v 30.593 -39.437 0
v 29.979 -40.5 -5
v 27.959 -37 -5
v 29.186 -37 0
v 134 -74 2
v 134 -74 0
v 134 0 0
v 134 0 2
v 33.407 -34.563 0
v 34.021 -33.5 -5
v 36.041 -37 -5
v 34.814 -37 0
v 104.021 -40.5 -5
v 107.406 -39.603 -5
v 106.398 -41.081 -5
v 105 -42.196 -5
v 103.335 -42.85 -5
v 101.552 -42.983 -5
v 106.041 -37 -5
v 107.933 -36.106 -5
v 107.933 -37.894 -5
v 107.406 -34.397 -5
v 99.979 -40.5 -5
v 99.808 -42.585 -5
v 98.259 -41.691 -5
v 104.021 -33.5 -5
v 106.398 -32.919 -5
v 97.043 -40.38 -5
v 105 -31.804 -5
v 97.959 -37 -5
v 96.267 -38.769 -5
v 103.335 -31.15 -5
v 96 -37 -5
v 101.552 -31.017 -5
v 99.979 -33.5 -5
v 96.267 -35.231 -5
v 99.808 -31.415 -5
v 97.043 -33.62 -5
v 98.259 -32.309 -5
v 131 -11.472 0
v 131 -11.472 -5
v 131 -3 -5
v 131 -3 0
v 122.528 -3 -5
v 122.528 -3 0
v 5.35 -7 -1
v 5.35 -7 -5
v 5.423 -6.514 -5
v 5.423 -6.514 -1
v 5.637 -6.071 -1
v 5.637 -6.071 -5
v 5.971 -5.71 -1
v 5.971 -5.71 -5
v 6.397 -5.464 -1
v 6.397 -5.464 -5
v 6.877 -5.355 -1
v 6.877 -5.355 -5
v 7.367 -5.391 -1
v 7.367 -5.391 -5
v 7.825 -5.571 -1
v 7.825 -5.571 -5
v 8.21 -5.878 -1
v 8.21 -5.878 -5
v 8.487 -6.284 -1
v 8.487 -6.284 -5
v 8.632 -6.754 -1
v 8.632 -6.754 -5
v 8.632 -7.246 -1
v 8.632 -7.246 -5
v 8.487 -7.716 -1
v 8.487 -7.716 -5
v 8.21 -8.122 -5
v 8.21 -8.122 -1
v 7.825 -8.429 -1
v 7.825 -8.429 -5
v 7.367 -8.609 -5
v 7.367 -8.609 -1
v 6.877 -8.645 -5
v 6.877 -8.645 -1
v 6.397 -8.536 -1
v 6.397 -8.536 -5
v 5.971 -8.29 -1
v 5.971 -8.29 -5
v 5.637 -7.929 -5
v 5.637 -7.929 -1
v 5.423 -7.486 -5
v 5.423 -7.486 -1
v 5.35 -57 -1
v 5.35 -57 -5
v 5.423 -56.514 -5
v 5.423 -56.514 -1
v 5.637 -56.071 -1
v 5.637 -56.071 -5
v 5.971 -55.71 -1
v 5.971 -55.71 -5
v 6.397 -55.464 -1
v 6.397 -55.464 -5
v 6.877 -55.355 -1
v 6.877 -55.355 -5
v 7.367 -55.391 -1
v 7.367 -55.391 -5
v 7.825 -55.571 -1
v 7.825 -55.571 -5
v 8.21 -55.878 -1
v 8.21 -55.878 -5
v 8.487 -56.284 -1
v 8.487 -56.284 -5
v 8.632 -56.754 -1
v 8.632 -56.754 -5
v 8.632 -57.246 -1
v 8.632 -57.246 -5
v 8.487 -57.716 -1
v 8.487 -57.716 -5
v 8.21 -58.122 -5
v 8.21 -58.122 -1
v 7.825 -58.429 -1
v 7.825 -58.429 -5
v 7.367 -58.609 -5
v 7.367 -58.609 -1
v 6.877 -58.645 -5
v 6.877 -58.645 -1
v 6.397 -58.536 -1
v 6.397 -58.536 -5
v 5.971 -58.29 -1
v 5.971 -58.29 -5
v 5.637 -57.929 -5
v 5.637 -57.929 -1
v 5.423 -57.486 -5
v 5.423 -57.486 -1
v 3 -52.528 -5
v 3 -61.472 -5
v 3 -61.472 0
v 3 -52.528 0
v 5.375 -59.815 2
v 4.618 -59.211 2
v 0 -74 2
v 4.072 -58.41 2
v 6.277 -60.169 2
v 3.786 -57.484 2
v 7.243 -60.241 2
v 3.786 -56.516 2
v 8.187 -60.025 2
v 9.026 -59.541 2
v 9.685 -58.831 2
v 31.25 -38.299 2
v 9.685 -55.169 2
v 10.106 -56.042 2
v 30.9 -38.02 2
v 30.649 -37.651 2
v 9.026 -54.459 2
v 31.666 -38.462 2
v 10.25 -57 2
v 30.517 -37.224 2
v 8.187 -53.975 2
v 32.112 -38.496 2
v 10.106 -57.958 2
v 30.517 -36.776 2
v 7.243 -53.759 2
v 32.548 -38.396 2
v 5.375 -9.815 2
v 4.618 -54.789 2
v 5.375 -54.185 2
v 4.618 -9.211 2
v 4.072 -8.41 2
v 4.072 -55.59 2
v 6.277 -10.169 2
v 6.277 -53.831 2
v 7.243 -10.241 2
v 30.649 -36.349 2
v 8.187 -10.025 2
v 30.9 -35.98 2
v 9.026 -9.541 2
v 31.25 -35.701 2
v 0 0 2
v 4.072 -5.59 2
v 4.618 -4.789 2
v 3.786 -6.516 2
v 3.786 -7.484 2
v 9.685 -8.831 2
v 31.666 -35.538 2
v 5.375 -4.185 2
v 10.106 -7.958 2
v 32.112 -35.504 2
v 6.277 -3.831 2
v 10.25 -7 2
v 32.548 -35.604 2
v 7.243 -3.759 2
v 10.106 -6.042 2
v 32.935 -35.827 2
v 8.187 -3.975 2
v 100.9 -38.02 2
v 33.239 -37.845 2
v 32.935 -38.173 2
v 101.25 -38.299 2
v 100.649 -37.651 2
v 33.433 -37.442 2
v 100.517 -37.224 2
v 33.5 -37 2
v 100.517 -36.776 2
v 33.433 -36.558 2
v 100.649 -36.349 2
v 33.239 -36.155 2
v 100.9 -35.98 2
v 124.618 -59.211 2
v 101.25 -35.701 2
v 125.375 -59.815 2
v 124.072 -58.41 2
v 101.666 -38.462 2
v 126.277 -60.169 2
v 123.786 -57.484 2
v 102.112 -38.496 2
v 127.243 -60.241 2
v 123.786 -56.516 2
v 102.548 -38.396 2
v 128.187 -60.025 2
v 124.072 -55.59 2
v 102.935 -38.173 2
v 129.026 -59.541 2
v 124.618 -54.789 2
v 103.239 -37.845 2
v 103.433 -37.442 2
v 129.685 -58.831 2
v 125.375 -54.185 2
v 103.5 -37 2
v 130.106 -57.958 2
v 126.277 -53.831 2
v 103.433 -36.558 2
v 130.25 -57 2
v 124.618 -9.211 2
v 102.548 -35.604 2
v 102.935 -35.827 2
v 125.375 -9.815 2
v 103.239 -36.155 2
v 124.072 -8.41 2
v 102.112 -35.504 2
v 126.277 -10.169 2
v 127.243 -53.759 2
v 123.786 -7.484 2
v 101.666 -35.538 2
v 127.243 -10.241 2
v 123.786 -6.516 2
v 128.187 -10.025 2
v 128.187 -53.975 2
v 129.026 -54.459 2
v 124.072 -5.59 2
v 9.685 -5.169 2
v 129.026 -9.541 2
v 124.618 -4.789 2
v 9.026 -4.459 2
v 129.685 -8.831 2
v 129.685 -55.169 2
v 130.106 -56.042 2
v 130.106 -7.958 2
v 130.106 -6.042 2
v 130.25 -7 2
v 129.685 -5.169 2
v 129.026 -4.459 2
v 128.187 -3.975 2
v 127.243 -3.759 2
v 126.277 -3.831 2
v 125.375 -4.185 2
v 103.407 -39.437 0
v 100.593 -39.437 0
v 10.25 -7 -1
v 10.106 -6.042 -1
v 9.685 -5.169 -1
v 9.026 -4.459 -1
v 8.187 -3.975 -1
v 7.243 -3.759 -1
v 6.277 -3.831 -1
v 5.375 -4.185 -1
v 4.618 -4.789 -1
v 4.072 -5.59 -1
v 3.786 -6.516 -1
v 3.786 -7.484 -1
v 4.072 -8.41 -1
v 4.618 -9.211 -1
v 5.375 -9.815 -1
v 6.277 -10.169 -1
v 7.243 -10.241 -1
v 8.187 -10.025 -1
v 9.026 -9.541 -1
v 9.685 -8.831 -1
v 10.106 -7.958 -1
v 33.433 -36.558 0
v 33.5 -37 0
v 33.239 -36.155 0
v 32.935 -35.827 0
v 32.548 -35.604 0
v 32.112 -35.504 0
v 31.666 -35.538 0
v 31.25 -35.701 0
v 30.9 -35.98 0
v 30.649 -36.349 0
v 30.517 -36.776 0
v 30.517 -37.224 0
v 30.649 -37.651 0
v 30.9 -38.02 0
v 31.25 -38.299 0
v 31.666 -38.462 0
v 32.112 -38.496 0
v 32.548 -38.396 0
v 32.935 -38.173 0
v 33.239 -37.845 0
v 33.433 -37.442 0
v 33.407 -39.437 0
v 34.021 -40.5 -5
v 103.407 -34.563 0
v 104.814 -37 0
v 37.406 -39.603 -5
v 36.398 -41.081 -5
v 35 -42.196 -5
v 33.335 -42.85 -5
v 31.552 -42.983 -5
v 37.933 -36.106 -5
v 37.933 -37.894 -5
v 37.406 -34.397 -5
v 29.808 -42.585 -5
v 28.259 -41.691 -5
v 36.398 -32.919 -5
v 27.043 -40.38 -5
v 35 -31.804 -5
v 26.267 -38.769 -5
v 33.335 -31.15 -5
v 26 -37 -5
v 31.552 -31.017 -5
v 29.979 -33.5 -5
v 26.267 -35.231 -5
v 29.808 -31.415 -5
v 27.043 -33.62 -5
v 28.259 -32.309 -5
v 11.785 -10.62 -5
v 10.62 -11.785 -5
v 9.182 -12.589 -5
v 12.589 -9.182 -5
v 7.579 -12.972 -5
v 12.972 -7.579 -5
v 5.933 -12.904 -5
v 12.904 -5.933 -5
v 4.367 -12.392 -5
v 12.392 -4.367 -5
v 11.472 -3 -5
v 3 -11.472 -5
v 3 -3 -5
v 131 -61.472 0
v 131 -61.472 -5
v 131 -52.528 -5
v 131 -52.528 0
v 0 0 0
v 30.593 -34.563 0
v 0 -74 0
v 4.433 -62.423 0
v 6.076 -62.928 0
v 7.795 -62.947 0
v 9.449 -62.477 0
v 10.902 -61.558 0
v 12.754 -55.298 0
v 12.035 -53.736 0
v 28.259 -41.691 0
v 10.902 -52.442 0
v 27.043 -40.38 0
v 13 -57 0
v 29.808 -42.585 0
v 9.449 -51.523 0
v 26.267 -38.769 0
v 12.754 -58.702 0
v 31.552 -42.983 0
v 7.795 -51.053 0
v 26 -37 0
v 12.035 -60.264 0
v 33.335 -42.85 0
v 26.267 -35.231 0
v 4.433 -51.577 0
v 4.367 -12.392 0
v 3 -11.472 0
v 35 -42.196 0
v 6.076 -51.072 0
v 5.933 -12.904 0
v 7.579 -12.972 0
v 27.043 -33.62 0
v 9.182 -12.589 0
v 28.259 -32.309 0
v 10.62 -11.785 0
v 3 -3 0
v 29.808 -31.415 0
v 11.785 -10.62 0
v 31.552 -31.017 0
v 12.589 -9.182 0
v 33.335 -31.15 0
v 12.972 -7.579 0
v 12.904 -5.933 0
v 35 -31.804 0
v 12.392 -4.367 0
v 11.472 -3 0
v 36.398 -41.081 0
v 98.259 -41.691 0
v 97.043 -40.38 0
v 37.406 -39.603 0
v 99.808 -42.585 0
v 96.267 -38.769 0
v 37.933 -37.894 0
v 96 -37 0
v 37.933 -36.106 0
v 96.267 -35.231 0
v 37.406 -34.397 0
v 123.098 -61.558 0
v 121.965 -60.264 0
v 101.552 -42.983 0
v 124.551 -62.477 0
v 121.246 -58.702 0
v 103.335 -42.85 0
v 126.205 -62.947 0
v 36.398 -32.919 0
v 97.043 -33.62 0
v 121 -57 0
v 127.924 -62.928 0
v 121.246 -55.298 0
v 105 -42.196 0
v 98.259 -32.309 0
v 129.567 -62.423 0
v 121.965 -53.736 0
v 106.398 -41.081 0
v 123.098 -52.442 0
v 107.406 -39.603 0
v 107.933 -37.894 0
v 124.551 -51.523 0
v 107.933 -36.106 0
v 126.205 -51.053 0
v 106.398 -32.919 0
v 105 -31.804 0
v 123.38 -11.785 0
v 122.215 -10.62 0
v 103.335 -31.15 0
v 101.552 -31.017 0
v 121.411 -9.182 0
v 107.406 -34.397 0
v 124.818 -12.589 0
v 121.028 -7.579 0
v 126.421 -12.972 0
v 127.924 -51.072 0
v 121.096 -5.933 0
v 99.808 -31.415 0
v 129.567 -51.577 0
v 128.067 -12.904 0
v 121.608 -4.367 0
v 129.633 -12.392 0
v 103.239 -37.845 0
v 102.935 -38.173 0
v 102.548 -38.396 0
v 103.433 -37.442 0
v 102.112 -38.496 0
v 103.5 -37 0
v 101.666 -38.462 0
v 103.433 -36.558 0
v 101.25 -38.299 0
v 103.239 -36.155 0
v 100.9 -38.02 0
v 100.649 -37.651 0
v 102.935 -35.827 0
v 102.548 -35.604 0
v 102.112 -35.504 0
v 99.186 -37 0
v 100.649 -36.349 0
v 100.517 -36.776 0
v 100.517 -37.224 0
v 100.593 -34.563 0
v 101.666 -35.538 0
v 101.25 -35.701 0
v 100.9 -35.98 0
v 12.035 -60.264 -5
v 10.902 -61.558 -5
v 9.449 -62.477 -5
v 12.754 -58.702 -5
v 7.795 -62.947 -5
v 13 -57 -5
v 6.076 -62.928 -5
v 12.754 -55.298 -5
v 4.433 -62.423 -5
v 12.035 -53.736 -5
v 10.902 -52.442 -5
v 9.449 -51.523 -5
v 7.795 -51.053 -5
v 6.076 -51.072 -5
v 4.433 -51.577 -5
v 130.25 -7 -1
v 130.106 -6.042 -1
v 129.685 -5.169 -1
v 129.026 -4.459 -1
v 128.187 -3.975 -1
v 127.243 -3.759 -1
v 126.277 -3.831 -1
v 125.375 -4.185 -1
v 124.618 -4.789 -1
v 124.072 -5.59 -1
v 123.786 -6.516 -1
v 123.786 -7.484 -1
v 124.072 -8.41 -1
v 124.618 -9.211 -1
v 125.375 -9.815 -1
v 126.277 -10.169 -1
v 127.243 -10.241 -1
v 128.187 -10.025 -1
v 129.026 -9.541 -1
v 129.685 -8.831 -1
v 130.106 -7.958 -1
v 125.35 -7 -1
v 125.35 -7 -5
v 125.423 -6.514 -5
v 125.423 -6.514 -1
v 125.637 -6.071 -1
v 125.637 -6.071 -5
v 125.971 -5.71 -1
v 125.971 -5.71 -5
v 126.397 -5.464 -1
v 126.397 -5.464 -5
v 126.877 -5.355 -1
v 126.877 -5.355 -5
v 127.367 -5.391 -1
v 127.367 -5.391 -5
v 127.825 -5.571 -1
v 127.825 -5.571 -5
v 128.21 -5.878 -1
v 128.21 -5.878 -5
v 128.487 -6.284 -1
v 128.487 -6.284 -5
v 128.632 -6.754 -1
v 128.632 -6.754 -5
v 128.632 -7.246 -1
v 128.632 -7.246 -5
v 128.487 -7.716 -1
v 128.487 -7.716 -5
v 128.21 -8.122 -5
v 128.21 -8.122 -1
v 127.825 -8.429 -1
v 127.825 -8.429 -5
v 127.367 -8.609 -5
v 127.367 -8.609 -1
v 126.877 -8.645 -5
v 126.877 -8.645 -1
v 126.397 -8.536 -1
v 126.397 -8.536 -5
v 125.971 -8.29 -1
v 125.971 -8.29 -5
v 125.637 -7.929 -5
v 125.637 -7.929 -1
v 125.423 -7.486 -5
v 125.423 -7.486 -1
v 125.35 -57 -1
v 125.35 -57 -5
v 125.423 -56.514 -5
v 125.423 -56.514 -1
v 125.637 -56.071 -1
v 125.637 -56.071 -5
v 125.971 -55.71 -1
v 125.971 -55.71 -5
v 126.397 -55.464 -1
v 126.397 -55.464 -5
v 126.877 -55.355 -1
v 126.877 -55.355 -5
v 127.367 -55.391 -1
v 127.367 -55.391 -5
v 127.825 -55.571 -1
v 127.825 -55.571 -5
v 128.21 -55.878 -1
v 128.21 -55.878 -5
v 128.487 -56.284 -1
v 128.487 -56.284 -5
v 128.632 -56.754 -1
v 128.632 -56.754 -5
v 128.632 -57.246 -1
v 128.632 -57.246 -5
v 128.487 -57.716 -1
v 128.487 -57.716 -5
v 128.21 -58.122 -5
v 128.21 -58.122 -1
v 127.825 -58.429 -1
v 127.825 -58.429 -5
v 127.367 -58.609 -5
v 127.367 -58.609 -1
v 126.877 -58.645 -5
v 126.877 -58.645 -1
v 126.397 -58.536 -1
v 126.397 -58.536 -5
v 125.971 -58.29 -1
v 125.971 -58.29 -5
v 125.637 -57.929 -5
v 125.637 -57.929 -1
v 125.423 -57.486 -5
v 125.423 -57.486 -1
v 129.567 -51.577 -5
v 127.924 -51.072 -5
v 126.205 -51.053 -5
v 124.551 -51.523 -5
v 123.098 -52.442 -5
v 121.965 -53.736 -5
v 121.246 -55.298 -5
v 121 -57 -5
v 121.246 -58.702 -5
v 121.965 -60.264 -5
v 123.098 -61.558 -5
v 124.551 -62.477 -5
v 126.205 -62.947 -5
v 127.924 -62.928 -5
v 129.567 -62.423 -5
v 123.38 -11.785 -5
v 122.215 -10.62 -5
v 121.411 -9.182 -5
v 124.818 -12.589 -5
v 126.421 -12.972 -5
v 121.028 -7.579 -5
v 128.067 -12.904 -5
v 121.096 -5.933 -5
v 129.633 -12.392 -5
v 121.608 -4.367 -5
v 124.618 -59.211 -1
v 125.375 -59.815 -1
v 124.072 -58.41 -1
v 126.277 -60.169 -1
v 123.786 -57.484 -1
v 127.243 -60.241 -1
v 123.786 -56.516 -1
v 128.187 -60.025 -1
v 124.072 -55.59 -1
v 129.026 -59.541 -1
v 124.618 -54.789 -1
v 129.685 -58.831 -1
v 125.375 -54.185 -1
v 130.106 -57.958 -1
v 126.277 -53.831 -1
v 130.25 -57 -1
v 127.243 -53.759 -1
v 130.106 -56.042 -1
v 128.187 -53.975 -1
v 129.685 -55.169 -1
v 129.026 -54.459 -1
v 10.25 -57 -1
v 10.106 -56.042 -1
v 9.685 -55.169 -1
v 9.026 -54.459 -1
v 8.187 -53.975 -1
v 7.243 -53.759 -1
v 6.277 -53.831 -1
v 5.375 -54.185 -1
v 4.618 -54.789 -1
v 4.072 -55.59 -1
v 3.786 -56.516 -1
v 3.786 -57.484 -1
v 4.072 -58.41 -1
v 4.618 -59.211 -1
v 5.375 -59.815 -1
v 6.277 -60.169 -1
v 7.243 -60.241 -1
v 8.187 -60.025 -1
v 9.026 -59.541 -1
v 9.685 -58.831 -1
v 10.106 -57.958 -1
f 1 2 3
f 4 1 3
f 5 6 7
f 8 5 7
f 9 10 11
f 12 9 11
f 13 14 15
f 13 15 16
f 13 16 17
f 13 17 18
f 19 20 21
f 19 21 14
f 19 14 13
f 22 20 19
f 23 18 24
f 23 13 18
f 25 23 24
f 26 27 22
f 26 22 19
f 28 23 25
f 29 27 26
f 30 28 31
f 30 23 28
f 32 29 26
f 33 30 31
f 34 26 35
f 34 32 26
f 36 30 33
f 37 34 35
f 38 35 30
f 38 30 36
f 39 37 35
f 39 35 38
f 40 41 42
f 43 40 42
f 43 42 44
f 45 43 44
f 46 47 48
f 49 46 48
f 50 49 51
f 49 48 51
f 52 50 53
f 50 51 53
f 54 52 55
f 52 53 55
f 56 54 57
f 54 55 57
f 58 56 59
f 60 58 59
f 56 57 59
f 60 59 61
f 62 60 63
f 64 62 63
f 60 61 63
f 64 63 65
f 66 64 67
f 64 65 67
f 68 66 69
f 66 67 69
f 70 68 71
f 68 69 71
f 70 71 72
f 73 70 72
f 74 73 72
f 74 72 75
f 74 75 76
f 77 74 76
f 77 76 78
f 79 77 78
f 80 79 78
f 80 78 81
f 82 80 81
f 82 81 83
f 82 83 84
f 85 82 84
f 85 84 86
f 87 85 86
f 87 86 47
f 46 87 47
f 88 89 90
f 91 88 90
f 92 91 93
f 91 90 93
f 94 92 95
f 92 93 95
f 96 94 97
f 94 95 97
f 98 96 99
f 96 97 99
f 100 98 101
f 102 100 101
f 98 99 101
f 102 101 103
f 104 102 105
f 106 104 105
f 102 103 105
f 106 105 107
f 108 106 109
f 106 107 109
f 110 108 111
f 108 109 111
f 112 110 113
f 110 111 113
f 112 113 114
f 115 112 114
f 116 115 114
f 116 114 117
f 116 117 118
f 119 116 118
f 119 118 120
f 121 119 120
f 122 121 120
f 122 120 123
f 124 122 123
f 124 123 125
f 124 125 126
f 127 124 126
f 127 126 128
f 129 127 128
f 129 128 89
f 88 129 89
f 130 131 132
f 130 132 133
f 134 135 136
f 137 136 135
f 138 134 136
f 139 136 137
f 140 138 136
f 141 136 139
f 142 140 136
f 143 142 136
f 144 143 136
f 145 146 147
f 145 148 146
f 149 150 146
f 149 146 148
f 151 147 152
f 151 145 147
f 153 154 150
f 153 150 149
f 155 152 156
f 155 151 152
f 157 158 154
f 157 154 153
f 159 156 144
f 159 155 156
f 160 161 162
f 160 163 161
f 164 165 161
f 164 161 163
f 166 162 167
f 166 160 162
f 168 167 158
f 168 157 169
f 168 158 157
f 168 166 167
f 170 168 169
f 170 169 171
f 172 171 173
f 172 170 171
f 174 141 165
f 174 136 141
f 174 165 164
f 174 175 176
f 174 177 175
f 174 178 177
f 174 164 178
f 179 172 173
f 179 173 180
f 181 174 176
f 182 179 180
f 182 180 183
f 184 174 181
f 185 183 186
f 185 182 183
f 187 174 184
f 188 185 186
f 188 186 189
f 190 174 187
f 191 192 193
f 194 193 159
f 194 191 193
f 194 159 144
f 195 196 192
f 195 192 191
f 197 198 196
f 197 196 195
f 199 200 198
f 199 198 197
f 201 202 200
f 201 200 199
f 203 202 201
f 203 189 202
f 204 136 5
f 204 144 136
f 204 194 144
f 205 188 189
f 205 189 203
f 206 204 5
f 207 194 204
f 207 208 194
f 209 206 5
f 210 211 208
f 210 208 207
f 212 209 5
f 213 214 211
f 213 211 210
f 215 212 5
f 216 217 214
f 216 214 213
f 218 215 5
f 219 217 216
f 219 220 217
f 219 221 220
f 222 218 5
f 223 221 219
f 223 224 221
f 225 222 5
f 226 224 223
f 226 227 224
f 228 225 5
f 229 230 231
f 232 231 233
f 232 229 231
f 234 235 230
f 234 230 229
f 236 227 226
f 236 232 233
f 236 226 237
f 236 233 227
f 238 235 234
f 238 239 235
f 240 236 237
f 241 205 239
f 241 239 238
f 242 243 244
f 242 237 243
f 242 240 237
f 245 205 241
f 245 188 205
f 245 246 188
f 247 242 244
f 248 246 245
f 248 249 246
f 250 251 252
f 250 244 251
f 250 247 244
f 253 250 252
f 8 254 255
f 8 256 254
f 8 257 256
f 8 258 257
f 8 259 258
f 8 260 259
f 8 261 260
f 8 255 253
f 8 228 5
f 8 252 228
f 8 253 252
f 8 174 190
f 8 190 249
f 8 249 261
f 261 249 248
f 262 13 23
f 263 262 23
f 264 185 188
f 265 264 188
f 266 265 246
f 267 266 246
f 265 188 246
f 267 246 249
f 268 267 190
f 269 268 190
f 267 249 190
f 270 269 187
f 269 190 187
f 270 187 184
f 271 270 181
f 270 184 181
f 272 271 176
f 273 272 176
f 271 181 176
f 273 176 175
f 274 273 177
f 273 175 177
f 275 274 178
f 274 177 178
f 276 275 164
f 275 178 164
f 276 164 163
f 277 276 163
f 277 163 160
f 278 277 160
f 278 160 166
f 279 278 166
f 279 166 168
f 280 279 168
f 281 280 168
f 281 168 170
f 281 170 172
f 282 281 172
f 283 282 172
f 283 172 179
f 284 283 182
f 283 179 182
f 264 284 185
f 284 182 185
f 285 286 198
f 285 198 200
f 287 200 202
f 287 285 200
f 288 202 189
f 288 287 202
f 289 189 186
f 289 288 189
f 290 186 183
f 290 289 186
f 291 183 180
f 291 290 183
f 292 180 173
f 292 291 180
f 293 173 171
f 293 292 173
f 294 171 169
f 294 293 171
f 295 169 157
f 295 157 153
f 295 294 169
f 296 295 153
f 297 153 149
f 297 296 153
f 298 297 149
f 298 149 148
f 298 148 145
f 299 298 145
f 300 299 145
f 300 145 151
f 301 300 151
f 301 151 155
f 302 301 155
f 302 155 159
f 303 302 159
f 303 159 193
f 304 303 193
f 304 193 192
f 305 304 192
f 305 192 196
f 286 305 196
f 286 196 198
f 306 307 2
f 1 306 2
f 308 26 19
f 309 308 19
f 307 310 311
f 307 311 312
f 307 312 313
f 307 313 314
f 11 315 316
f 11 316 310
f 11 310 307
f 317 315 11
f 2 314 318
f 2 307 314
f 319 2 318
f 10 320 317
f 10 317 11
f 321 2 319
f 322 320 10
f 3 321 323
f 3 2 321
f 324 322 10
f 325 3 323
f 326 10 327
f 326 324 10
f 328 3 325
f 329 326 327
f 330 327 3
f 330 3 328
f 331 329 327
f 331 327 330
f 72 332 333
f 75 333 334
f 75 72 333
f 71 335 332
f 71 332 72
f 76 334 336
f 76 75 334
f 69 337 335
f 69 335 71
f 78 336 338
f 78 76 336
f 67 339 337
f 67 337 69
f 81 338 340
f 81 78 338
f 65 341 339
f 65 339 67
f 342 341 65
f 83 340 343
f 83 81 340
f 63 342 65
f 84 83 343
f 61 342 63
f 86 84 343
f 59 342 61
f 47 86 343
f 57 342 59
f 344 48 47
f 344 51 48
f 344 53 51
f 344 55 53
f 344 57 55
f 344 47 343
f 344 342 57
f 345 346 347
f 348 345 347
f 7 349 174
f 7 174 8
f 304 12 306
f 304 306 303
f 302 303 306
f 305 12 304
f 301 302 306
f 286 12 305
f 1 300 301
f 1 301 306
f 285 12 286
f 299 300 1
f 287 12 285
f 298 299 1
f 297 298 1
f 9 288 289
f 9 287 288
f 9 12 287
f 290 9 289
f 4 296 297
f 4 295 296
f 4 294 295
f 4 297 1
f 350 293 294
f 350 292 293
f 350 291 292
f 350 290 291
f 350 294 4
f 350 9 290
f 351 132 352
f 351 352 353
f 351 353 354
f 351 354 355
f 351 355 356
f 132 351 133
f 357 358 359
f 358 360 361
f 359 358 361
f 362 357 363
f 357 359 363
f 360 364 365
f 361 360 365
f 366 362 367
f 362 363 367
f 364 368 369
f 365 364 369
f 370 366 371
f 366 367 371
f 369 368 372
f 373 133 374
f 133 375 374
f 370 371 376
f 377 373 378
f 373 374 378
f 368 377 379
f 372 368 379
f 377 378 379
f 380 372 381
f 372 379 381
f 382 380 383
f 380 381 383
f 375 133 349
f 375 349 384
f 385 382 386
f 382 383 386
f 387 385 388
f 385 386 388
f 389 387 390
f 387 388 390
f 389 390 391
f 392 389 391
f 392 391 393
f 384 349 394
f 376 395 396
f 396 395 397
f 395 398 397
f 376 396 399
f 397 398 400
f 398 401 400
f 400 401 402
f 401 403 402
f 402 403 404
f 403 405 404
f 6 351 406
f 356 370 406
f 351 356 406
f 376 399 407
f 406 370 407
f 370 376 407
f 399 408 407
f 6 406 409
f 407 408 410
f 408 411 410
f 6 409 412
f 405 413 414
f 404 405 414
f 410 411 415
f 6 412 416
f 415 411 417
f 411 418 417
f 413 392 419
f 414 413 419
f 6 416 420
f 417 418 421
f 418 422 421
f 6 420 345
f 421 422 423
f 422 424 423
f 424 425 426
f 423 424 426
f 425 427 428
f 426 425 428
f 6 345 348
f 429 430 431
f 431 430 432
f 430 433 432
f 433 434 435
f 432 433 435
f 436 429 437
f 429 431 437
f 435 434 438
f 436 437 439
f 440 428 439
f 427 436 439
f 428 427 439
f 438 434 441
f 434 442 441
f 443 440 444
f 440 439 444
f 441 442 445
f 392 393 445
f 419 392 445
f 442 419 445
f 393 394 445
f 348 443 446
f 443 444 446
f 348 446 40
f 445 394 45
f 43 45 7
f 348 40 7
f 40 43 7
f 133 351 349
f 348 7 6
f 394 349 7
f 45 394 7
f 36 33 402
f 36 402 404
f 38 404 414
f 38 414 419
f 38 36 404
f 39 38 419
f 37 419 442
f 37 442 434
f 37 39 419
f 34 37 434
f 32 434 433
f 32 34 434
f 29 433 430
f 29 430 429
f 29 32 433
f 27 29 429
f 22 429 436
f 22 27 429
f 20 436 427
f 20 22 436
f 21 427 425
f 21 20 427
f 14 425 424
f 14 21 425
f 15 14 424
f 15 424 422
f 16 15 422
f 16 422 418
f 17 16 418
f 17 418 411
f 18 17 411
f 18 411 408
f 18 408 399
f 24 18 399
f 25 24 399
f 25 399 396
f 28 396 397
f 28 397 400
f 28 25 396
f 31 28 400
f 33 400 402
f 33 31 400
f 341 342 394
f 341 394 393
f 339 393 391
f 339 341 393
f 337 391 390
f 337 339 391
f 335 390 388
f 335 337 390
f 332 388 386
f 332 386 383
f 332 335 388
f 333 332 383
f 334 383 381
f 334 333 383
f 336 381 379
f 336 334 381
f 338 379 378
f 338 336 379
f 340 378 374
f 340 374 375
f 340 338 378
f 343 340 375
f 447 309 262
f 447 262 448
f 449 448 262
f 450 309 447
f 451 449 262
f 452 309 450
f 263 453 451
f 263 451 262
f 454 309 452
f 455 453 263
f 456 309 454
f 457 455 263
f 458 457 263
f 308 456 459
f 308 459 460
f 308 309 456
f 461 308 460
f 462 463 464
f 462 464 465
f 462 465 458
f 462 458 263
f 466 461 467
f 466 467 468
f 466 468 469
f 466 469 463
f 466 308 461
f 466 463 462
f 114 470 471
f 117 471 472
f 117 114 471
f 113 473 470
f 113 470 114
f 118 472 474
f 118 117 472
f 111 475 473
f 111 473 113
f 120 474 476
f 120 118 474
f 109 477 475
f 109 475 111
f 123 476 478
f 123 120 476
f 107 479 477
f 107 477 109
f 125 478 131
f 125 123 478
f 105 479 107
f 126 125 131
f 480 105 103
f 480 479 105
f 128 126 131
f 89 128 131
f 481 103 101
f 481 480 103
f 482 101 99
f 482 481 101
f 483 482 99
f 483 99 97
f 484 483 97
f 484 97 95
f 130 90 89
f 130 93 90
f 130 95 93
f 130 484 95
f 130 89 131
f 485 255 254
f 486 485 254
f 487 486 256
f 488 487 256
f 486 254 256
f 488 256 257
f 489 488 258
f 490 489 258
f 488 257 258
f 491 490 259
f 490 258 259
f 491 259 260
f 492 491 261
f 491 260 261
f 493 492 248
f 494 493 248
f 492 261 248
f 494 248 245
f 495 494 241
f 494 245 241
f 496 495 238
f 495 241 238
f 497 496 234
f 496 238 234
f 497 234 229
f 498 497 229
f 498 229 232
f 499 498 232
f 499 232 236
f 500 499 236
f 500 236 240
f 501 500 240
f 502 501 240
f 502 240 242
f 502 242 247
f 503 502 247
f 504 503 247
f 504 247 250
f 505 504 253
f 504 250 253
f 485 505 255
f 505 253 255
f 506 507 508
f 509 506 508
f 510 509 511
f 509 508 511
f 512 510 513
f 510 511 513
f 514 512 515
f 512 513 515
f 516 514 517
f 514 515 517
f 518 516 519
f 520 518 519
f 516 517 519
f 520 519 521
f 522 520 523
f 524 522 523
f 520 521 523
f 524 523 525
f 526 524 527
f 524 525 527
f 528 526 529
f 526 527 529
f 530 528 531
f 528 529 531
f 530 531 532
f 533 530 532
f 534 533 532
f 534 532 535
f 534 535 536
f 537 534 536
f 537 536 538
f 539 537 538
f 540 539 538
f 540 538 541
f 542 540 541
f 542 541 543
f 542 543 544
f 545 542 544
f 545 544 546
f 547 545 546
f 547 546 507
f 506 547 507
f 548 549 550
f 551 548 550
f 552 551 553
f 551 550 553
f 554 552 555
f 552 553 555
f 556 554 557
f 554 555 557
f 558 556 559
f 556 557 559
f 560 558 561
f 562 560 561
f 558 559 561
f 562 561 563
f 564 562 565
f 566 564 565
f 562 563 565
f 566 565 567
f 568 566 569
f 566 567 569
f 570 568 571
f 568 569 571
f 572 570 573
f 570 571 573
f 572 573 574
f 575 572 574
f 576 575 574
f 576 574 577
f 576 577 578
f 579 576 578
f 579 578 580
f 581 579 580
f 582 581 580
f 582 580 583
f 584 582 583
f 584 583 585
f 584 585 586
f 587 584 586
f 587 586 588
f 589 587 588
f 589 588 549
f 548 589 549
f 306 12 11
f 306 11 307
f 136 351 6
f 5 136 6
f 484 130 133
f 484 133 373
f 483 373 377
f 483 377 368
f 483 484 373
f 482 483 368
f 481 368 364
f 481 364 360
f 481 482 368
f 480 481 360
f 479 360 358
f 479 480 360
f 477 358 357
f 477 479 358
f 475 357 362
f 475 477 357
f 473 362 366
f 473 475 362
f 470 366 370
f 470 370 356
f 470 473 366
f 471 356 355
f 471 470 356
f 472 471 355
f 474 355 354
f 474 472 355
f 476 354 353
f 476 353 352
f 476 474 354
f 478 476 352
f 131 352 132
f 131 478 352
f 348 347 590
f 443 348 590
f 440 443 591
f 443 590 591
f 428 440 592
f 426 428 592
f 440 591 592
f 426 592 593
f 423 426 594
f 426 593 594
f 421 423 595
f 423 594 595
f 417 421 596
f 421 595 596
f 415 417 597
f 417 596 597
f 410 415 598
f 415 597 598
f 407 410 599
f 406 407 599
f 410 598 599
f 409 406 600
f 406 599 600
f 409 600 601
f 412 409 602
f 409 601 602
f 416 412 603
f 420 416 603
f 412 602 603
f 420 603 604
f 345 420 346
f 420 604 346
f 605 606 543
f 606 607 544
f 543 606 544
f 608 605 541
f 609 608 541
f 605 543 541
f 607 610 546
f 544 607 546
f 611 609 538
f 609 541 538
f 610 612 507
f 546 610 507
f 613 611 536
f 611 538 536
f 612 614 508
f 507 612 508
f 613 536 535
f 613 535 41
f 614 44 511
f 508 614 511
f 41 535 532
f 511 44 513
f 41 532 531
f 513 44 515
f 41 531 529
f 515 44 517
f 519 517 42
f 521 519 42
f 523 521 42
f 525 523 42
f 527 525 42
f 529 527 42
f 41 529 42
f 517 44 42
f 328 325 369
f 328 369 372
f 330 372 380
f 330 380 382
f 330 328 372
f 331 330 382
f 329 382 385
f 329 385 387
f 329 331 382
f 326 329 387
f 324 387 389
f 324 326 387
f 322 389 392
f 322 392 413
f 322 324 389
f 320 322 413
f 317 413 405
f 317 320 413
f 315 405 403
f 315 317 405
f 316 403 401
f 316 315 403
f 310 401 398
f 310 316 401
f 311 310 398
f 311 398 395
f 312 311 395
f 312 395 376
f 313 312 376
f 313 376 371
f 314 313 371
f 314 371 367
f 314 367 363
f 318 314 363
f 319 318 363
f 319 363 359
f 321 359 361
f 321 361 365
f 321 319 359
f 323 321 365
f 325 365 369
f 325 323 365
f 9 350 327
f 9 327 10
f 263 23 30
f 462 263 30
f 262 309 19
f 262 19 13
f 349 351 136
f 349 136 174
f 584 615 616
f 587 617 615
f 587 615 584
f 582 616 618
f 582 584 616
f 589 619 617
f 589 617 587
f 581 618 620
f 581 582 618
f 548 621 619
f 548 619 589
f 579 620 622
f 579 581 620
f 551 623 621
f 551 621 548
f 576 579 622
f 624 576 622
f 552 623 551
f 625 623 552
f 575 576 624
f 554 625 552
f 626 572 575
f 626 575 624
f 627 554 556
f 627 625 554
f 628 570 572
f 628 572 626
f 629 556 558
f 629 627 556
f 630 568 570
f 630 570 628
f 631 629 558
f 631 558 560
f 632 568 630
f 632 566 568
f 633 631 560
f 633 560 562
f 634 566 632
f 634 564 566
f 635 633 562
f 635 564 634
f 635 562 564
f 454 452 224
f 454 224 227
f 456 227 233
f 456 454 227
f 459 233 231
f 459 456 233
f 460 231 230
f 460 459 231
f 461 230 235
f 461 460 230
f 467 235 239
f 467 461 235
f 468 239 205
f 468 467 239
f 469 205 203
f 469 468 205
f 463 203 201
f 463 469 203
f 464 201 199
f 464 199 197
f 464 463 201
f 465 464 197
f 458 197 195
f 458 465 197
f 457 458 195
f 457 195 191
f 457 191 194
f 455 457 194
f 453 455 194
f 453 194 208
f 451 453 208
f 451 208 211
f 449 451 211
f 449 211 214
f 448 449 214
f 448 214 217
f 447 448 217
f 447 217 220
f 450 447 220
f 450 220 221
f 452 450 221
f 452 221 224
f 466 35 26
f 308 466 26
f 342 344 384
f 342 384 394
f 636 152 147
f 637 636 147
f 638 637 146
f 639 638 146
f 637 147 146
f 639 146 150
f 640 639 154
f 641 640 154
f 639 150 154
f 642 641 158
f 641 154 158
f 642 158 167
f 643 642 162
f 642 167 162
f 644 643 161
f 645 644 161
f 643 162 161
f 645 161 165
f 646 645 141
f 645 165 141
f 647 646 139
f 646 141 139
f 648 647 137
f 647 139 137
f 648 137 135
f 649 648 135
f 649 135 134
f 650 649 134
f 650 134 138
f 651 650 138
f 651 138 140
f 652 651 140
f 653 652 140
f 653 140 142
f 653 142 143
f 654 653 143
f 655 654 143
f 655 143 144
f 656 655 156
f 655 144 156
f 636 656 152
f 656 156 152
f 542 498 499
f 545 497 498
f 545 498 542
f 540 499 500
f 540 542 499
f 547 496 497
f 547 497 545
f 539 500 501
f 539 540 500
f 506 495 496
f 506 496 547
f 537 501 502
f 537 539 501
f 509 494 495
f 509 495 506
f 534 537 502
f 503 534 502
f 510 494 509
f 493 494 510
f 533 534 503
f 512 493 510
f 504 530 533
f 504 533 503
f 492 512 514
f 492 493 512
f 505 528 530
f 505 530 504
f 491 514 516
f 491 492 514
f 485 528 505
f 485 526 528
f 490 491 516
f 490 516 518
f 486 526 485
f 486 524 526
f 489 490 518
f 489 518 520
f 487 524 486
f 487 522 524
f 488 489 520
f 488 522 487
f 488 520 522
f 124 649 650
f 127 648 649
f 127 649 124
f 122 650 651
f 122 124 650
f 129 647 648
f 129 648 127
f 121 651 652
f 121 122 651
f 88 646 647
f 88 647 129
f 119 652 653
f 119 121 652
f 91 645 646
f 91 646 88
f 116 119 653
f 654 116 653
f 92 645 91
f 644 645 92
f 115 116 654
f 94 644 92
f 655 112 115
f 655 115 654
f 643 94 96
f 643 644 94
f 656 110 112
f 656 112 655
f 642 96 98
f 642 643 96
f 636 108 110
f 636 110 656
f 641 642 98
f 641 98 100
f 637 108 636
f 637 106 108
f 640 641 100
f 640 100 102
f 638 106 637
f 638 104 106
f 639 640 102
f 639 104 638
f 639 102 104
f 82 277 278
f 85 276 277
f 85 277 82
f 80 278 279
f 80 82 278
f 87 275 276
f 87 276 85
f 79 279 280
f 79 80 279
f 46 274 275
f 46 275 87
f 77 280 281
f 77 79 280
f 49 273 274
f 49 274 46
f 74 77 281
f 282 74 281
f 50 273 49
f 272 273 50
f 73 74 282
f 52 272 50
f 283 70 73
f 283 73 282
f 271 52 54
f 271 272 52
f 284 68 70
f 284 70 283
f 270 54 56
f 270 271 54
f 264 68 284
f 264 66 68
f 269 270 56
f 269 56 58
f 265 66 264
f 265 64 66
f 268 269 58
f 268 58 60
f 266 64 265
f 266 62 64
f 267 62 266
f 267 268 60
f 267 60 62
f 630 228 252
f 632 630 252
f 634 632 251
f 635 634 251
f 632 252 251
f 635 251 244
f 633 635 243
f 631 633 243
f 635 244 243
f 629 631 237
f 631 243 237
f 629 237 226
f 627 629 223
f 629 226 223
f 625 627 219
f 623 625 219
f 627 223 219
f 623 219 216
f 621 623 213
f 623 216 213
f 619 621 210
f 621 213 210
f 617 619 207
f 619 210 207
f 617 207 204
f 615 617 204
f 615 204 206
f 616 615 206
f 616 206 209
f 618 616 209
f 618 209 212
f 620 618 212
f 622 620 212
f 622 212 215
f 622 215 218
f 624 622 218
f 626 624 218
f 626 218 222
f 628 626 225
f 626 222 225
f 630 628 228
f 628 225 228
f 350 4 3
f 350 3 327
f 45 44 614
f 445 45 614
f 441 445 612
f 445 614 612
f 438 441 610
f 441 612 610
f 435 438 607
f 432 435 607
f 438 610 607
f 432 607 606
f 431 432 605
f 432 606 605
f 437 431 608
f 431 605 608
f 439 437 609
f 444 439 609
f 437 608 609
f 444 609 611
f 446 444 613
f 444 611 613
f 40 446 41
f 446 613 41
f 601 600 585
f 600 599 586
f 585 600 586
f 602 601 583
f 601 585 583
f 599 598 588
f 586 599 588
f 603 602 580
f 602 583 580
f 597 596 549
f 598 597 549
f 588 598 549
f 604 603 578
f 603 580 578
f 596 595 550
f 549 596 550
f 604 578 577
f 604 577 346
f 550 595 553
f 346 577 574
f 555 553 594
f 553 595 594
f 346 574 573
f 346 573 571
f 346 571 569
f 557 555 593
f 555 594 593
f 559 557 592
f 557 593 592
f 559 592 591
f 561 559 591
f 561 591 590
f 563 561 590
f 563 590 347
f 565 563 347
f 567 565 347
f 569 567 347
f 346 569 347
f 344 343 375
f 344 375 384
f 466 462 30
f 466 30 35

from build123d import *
from build123d.topology import SkipClean

# Parameters (mm, degrees)
ESBO_O1_W                       = 134
ESBO_O1_H                       = 74
ESBO_O1_R                       = 1.5
ESBO_O1_R_2                     = 1.65
RESSALTO_EXTRUS_O1_DEPTH        = 2
RESSALTO_EXTRUS_O2_START        = 5
ESBO_O2_R                       = 6
ESBO_O2_R_2                     = 1.5
ESBO_O2_R_3                     = 1.65
RESSALTO_EXTRUS_O2_DEPTH        = 5
ESBO_O3_R                       = 3.25
CORTE_EXTRUS_O1_DEPTH           = 3
CORTE_EXTRUS_O2_DEPTH           = 5
CORTE_EXTRUS_O2_DRAFT           = -12
CORTE_EXTRUS_O2_PROFILE_2_DEPTH = 5
CORTE_EXTRUS_O2_PROFILE_2_DRAFT = -12


with BuildPart() as part:
    # Esboço1 → Ressalto-extrusão1 (new body)
    with BuildSketch(Plane.XY):
        with Locations((67, -37)):
            Rectangle(ESBO_O1_W, ESBO_O1_H)
        with Locations((102, -37)):
            Circle(ESBO_O1_R, mode=Mode.SUBTRACT)
        with Locations((7, -7)):
            Circle(ESBO_O1_R_2, mode=Mode.SUBTRACT)
        with Locations((127, -7)):
            Circle(ESBO_O1_R_2, mode=Mode.SUBTRACT)
        with Locations((127, -57)):
            Circle(ESBO_O1_R_2, mode=Mode.SUBTRACT)
        with Locations((7, -57)):
            Circle(ESBO_O1_R_2, mode=Mode.SUBTRACT)
        with Locations((32, -37)):
            Circle(ESBO_O1_R, mode=Mode.SUBTRACT)
    extrude(amount=RESSALTO_EXTRUS_O1_DEPTH)

    # Esboço2 → Ressalto-extrusão2 (add)
    # profile 1 of 6: a face of its own
    with SkipClean():  # the faces are left unmerged after this step: merging them gives an invalid solid
        with BuildSketch(Plane(origin=(0, 0, 0), x_dir=(-1, 0, 0), z_dir=(0, 0, -1)).offset(RESSALTO_EXTRUS_O2_START)):
            with Locations((-102, -37)):
                Circle(ESBO_O2_R)
            with Locations((-102, -37)):
                Circle(ESBO_O2_R_2, mode=Mode.SUBTRACT)
        # profile 2 of 6: a face of its own
        with BuildSketch(Plane(origin=(0, 0, 0), x_dir=(-1, 0, 0), z_dir=(0, 0, -1)).offset(RESSALTO_EXTRUS_O2_START)):
            with Locations((-32, -37)):
                Circle(ESBO_O2_R)
            with Locations((-32, -37)):
                Circle(ESBO_O2_R_2, mode=Mode.SUBTRACT)
        # profile 3 of 6: a face of its own
        with BuildSketch(Plane(origin=(0, 0, 0), x_dir=(-1, 0, 0), z_dir=(0, 0, -1)).offset(RESSALTO_EXTRUS_O2_START)):
            with BuildLine():
                Line((-3, -61.472135955), (-3, -52.527864045))
                ThreePointArc((-3, -52.527864045), (-13, -57), (-3, -61.472135955))
            make_face()
            with Locations((-7, -57)):
                Circle(ESBO_O2_R_3, mode=Mode.SUBTRACT)
        # profile 4 of 6: a face of its own
        with BuildSketch(Plane(origin=(0, 0, 0), x_dir=(-1, 0, 0), z_dir=(0, 0, -1)).offset(RESSALTO_EXTRUS_O2_START)):
            with BuildLine():
                Line((-3, -3), (-11.472135955, -3))
                ThreePointArc((-11.472135955, -3), (-11.242640687, -11.242640687), (-3, -11.472135955))
                Line((-3, -11.472135955), (-3, -3))
            make_face()
            with Locations((-7, -7)):
                Circle(ESBO_O2_R_3, mode=Mode.SUBTRACT)
        # profile 5 of 6: a face of its own
        with BuildSketch(Plane(origin=(0, 0, 0), x_dir=(-1, 0, 0), z_dir=(0, 0, -1)).offset(RESSALTO_EXTRUS_O2_START)):
            with BuildLine():
                Line((-131, -61.472135955), (-131, -52.527864045))
                ThreePointArc((-131, -52.527864045), (-121, -57), (-131, -61.472135955))
            make_face()
            with Locations((-127, -57)):
                Circle(ESBO_O2_R_3, mode=Mode.SUBTRACT)
        # profile 6 of 6: a face of its own
        with BuildSketch(Plane(origin=(0, 0, 0), x_dir=(-1, 0, 0), z_dir=(0, 0, -1)).offset(RESSALTO_EXTRUS_O2_START)):
            with BuildLine():
                Line((-131, -11.472135955), (-131, -3))
                Line((-131, -3), (-122.527864045, -3))
                ThreePointArc((-122.527864045, -3), (-122.757359313, -11.242640687), (-131, -11.472135955))
            make_face()
            with Locations((-127, -7)):
                Circle(ESBO_O2_R_3, mode=Mode.SUBTRACT)
        extrude(amount=-RESSALTO_EXTRUS_O2_DEPTH)

    # Esboço3 → Corte-extrusão1 (cut)
    with SkipClean():  # the faces are left unmerged after this step: merging them gives an invalid solid
        with BuildSketch(Plane.XY.offset(2)):
            with Locations((7, -7)):
                Circle(ESBO_O3_R)
            with Locations((7, -57)):
                Circle(ESBO_O3_R)
            with Locations((127, -7)):
                Circle(ESBO_O3_R)
            with Locations((127, -57)):
                Circle(ESBO_O3_R)
        extrude(amount=-CORTE_EXTRUS_O1_DEPTH, mode=Mode.SUBTRACT)


with BuildPart() as corte_extrus_o2_tool:
    # Esboço4 → Corte-extrusão2 (with draft: the straight prism first)
    with BuildSketch(Plane(origin=(0, 0, -5), x_dir=(-1, 0, 0), z_dir=(0, 0, -1))):
        Polygon((-34.020725942, -40.5), (-29.979274058, -40.5), (-27.958548116, -37), (-29.979274058, -33.5), (-34.020725942, -33.5), (-36.041451884, -37), align=None)
    extrude(amount=-CORTE_EXTRUS_O2_DEPTH)
    # Corte-extrusão2: the draft: its side faces are tilted about the plane it starts from
    corte_extrus_o2_sides = [corte_extrus_o2_tool.faces().sort_by_distance(p)[0] for p in [
        (32, -40.5, -2.5),
        (28.968911087, -38.75, -2.5),
        (28.968911087, -35.25, -2.5),
        (32, -33.5, -2.5),
        (35.031088913, -35.25, -2.5),
        (35.031088913, -38.75, -2.5),
    ]]
    draft(corte_extrus_o2_sides, Plane(origin=(0, 0, -5), x_dir=(-1, 0, 0), z_dir=(0, 0, -1)), CORTE_EXTRUS_O2_DRAFT)


with BuildPart() as part_1:
    add(part.part)

    # Corte-extrusão2: cut by corte_extrus_o2_tool
    add(corte_extrus_o2_tool.part, mode=Mode.SUBTRACT)


with BuildPart() as corte_extrus_o2_profile_2_tool:
    # Esboço4 → Corte-extrusão2 profile 2 (with draft: the straight prism first)
    with BuildSketch(Plane(origin=(0, 0, -5), x_dir=(-1, 0, 0), z_dir=(0, 0, -1))):
        Polygon((-97.958548116, -37), (-99.979274058, -33.5), (-104.020725942, -33.5), (-106.041451884, -37), (-104.020725942, -40.5), (-99.979274058, -40.5), align=None)
    extrude(amount=-CORTE_EXTRUS_O2_PROFILE_2_DEPTH)
    # Corte-extrusão2 profile 2: the draft: its side faces are tilted about the plane it starts from
    corte_extrus_o2_profile_2_sides = [corte_extrus_o2_profile_2_tool.faces().sort_by_distance(p)[0] for p in [
        (98.968911087, -35.25, -2.5),
        (102, -33.5, -2.5),
        (105.031088913, -35.25, -2.5),
        (105.031088913, -38.75, -2.5),
        (102, -40.5, -2.5),
        (98.968911087, -38.75, -2.5),
    ]]
    draft(corte_extrus_o2_profile_2_sides, Plane(origin=(0, 0, -5), x_dir=(-1, 0, 0), z_dir=(0, 0, -1)), CORTE_EXTRUS_O2_PROFILE_2_DRAFT)


with BuildPart() as part_2:
    add(part_1.part)

    # Corte-extrusão2 profile 2: cut by corte_extrus_o2_profile_2_tool
    add(corte_extrus_o2_profile_2_tool.part, mode=Mode.SUBTRACT)


solid = part_2.part
